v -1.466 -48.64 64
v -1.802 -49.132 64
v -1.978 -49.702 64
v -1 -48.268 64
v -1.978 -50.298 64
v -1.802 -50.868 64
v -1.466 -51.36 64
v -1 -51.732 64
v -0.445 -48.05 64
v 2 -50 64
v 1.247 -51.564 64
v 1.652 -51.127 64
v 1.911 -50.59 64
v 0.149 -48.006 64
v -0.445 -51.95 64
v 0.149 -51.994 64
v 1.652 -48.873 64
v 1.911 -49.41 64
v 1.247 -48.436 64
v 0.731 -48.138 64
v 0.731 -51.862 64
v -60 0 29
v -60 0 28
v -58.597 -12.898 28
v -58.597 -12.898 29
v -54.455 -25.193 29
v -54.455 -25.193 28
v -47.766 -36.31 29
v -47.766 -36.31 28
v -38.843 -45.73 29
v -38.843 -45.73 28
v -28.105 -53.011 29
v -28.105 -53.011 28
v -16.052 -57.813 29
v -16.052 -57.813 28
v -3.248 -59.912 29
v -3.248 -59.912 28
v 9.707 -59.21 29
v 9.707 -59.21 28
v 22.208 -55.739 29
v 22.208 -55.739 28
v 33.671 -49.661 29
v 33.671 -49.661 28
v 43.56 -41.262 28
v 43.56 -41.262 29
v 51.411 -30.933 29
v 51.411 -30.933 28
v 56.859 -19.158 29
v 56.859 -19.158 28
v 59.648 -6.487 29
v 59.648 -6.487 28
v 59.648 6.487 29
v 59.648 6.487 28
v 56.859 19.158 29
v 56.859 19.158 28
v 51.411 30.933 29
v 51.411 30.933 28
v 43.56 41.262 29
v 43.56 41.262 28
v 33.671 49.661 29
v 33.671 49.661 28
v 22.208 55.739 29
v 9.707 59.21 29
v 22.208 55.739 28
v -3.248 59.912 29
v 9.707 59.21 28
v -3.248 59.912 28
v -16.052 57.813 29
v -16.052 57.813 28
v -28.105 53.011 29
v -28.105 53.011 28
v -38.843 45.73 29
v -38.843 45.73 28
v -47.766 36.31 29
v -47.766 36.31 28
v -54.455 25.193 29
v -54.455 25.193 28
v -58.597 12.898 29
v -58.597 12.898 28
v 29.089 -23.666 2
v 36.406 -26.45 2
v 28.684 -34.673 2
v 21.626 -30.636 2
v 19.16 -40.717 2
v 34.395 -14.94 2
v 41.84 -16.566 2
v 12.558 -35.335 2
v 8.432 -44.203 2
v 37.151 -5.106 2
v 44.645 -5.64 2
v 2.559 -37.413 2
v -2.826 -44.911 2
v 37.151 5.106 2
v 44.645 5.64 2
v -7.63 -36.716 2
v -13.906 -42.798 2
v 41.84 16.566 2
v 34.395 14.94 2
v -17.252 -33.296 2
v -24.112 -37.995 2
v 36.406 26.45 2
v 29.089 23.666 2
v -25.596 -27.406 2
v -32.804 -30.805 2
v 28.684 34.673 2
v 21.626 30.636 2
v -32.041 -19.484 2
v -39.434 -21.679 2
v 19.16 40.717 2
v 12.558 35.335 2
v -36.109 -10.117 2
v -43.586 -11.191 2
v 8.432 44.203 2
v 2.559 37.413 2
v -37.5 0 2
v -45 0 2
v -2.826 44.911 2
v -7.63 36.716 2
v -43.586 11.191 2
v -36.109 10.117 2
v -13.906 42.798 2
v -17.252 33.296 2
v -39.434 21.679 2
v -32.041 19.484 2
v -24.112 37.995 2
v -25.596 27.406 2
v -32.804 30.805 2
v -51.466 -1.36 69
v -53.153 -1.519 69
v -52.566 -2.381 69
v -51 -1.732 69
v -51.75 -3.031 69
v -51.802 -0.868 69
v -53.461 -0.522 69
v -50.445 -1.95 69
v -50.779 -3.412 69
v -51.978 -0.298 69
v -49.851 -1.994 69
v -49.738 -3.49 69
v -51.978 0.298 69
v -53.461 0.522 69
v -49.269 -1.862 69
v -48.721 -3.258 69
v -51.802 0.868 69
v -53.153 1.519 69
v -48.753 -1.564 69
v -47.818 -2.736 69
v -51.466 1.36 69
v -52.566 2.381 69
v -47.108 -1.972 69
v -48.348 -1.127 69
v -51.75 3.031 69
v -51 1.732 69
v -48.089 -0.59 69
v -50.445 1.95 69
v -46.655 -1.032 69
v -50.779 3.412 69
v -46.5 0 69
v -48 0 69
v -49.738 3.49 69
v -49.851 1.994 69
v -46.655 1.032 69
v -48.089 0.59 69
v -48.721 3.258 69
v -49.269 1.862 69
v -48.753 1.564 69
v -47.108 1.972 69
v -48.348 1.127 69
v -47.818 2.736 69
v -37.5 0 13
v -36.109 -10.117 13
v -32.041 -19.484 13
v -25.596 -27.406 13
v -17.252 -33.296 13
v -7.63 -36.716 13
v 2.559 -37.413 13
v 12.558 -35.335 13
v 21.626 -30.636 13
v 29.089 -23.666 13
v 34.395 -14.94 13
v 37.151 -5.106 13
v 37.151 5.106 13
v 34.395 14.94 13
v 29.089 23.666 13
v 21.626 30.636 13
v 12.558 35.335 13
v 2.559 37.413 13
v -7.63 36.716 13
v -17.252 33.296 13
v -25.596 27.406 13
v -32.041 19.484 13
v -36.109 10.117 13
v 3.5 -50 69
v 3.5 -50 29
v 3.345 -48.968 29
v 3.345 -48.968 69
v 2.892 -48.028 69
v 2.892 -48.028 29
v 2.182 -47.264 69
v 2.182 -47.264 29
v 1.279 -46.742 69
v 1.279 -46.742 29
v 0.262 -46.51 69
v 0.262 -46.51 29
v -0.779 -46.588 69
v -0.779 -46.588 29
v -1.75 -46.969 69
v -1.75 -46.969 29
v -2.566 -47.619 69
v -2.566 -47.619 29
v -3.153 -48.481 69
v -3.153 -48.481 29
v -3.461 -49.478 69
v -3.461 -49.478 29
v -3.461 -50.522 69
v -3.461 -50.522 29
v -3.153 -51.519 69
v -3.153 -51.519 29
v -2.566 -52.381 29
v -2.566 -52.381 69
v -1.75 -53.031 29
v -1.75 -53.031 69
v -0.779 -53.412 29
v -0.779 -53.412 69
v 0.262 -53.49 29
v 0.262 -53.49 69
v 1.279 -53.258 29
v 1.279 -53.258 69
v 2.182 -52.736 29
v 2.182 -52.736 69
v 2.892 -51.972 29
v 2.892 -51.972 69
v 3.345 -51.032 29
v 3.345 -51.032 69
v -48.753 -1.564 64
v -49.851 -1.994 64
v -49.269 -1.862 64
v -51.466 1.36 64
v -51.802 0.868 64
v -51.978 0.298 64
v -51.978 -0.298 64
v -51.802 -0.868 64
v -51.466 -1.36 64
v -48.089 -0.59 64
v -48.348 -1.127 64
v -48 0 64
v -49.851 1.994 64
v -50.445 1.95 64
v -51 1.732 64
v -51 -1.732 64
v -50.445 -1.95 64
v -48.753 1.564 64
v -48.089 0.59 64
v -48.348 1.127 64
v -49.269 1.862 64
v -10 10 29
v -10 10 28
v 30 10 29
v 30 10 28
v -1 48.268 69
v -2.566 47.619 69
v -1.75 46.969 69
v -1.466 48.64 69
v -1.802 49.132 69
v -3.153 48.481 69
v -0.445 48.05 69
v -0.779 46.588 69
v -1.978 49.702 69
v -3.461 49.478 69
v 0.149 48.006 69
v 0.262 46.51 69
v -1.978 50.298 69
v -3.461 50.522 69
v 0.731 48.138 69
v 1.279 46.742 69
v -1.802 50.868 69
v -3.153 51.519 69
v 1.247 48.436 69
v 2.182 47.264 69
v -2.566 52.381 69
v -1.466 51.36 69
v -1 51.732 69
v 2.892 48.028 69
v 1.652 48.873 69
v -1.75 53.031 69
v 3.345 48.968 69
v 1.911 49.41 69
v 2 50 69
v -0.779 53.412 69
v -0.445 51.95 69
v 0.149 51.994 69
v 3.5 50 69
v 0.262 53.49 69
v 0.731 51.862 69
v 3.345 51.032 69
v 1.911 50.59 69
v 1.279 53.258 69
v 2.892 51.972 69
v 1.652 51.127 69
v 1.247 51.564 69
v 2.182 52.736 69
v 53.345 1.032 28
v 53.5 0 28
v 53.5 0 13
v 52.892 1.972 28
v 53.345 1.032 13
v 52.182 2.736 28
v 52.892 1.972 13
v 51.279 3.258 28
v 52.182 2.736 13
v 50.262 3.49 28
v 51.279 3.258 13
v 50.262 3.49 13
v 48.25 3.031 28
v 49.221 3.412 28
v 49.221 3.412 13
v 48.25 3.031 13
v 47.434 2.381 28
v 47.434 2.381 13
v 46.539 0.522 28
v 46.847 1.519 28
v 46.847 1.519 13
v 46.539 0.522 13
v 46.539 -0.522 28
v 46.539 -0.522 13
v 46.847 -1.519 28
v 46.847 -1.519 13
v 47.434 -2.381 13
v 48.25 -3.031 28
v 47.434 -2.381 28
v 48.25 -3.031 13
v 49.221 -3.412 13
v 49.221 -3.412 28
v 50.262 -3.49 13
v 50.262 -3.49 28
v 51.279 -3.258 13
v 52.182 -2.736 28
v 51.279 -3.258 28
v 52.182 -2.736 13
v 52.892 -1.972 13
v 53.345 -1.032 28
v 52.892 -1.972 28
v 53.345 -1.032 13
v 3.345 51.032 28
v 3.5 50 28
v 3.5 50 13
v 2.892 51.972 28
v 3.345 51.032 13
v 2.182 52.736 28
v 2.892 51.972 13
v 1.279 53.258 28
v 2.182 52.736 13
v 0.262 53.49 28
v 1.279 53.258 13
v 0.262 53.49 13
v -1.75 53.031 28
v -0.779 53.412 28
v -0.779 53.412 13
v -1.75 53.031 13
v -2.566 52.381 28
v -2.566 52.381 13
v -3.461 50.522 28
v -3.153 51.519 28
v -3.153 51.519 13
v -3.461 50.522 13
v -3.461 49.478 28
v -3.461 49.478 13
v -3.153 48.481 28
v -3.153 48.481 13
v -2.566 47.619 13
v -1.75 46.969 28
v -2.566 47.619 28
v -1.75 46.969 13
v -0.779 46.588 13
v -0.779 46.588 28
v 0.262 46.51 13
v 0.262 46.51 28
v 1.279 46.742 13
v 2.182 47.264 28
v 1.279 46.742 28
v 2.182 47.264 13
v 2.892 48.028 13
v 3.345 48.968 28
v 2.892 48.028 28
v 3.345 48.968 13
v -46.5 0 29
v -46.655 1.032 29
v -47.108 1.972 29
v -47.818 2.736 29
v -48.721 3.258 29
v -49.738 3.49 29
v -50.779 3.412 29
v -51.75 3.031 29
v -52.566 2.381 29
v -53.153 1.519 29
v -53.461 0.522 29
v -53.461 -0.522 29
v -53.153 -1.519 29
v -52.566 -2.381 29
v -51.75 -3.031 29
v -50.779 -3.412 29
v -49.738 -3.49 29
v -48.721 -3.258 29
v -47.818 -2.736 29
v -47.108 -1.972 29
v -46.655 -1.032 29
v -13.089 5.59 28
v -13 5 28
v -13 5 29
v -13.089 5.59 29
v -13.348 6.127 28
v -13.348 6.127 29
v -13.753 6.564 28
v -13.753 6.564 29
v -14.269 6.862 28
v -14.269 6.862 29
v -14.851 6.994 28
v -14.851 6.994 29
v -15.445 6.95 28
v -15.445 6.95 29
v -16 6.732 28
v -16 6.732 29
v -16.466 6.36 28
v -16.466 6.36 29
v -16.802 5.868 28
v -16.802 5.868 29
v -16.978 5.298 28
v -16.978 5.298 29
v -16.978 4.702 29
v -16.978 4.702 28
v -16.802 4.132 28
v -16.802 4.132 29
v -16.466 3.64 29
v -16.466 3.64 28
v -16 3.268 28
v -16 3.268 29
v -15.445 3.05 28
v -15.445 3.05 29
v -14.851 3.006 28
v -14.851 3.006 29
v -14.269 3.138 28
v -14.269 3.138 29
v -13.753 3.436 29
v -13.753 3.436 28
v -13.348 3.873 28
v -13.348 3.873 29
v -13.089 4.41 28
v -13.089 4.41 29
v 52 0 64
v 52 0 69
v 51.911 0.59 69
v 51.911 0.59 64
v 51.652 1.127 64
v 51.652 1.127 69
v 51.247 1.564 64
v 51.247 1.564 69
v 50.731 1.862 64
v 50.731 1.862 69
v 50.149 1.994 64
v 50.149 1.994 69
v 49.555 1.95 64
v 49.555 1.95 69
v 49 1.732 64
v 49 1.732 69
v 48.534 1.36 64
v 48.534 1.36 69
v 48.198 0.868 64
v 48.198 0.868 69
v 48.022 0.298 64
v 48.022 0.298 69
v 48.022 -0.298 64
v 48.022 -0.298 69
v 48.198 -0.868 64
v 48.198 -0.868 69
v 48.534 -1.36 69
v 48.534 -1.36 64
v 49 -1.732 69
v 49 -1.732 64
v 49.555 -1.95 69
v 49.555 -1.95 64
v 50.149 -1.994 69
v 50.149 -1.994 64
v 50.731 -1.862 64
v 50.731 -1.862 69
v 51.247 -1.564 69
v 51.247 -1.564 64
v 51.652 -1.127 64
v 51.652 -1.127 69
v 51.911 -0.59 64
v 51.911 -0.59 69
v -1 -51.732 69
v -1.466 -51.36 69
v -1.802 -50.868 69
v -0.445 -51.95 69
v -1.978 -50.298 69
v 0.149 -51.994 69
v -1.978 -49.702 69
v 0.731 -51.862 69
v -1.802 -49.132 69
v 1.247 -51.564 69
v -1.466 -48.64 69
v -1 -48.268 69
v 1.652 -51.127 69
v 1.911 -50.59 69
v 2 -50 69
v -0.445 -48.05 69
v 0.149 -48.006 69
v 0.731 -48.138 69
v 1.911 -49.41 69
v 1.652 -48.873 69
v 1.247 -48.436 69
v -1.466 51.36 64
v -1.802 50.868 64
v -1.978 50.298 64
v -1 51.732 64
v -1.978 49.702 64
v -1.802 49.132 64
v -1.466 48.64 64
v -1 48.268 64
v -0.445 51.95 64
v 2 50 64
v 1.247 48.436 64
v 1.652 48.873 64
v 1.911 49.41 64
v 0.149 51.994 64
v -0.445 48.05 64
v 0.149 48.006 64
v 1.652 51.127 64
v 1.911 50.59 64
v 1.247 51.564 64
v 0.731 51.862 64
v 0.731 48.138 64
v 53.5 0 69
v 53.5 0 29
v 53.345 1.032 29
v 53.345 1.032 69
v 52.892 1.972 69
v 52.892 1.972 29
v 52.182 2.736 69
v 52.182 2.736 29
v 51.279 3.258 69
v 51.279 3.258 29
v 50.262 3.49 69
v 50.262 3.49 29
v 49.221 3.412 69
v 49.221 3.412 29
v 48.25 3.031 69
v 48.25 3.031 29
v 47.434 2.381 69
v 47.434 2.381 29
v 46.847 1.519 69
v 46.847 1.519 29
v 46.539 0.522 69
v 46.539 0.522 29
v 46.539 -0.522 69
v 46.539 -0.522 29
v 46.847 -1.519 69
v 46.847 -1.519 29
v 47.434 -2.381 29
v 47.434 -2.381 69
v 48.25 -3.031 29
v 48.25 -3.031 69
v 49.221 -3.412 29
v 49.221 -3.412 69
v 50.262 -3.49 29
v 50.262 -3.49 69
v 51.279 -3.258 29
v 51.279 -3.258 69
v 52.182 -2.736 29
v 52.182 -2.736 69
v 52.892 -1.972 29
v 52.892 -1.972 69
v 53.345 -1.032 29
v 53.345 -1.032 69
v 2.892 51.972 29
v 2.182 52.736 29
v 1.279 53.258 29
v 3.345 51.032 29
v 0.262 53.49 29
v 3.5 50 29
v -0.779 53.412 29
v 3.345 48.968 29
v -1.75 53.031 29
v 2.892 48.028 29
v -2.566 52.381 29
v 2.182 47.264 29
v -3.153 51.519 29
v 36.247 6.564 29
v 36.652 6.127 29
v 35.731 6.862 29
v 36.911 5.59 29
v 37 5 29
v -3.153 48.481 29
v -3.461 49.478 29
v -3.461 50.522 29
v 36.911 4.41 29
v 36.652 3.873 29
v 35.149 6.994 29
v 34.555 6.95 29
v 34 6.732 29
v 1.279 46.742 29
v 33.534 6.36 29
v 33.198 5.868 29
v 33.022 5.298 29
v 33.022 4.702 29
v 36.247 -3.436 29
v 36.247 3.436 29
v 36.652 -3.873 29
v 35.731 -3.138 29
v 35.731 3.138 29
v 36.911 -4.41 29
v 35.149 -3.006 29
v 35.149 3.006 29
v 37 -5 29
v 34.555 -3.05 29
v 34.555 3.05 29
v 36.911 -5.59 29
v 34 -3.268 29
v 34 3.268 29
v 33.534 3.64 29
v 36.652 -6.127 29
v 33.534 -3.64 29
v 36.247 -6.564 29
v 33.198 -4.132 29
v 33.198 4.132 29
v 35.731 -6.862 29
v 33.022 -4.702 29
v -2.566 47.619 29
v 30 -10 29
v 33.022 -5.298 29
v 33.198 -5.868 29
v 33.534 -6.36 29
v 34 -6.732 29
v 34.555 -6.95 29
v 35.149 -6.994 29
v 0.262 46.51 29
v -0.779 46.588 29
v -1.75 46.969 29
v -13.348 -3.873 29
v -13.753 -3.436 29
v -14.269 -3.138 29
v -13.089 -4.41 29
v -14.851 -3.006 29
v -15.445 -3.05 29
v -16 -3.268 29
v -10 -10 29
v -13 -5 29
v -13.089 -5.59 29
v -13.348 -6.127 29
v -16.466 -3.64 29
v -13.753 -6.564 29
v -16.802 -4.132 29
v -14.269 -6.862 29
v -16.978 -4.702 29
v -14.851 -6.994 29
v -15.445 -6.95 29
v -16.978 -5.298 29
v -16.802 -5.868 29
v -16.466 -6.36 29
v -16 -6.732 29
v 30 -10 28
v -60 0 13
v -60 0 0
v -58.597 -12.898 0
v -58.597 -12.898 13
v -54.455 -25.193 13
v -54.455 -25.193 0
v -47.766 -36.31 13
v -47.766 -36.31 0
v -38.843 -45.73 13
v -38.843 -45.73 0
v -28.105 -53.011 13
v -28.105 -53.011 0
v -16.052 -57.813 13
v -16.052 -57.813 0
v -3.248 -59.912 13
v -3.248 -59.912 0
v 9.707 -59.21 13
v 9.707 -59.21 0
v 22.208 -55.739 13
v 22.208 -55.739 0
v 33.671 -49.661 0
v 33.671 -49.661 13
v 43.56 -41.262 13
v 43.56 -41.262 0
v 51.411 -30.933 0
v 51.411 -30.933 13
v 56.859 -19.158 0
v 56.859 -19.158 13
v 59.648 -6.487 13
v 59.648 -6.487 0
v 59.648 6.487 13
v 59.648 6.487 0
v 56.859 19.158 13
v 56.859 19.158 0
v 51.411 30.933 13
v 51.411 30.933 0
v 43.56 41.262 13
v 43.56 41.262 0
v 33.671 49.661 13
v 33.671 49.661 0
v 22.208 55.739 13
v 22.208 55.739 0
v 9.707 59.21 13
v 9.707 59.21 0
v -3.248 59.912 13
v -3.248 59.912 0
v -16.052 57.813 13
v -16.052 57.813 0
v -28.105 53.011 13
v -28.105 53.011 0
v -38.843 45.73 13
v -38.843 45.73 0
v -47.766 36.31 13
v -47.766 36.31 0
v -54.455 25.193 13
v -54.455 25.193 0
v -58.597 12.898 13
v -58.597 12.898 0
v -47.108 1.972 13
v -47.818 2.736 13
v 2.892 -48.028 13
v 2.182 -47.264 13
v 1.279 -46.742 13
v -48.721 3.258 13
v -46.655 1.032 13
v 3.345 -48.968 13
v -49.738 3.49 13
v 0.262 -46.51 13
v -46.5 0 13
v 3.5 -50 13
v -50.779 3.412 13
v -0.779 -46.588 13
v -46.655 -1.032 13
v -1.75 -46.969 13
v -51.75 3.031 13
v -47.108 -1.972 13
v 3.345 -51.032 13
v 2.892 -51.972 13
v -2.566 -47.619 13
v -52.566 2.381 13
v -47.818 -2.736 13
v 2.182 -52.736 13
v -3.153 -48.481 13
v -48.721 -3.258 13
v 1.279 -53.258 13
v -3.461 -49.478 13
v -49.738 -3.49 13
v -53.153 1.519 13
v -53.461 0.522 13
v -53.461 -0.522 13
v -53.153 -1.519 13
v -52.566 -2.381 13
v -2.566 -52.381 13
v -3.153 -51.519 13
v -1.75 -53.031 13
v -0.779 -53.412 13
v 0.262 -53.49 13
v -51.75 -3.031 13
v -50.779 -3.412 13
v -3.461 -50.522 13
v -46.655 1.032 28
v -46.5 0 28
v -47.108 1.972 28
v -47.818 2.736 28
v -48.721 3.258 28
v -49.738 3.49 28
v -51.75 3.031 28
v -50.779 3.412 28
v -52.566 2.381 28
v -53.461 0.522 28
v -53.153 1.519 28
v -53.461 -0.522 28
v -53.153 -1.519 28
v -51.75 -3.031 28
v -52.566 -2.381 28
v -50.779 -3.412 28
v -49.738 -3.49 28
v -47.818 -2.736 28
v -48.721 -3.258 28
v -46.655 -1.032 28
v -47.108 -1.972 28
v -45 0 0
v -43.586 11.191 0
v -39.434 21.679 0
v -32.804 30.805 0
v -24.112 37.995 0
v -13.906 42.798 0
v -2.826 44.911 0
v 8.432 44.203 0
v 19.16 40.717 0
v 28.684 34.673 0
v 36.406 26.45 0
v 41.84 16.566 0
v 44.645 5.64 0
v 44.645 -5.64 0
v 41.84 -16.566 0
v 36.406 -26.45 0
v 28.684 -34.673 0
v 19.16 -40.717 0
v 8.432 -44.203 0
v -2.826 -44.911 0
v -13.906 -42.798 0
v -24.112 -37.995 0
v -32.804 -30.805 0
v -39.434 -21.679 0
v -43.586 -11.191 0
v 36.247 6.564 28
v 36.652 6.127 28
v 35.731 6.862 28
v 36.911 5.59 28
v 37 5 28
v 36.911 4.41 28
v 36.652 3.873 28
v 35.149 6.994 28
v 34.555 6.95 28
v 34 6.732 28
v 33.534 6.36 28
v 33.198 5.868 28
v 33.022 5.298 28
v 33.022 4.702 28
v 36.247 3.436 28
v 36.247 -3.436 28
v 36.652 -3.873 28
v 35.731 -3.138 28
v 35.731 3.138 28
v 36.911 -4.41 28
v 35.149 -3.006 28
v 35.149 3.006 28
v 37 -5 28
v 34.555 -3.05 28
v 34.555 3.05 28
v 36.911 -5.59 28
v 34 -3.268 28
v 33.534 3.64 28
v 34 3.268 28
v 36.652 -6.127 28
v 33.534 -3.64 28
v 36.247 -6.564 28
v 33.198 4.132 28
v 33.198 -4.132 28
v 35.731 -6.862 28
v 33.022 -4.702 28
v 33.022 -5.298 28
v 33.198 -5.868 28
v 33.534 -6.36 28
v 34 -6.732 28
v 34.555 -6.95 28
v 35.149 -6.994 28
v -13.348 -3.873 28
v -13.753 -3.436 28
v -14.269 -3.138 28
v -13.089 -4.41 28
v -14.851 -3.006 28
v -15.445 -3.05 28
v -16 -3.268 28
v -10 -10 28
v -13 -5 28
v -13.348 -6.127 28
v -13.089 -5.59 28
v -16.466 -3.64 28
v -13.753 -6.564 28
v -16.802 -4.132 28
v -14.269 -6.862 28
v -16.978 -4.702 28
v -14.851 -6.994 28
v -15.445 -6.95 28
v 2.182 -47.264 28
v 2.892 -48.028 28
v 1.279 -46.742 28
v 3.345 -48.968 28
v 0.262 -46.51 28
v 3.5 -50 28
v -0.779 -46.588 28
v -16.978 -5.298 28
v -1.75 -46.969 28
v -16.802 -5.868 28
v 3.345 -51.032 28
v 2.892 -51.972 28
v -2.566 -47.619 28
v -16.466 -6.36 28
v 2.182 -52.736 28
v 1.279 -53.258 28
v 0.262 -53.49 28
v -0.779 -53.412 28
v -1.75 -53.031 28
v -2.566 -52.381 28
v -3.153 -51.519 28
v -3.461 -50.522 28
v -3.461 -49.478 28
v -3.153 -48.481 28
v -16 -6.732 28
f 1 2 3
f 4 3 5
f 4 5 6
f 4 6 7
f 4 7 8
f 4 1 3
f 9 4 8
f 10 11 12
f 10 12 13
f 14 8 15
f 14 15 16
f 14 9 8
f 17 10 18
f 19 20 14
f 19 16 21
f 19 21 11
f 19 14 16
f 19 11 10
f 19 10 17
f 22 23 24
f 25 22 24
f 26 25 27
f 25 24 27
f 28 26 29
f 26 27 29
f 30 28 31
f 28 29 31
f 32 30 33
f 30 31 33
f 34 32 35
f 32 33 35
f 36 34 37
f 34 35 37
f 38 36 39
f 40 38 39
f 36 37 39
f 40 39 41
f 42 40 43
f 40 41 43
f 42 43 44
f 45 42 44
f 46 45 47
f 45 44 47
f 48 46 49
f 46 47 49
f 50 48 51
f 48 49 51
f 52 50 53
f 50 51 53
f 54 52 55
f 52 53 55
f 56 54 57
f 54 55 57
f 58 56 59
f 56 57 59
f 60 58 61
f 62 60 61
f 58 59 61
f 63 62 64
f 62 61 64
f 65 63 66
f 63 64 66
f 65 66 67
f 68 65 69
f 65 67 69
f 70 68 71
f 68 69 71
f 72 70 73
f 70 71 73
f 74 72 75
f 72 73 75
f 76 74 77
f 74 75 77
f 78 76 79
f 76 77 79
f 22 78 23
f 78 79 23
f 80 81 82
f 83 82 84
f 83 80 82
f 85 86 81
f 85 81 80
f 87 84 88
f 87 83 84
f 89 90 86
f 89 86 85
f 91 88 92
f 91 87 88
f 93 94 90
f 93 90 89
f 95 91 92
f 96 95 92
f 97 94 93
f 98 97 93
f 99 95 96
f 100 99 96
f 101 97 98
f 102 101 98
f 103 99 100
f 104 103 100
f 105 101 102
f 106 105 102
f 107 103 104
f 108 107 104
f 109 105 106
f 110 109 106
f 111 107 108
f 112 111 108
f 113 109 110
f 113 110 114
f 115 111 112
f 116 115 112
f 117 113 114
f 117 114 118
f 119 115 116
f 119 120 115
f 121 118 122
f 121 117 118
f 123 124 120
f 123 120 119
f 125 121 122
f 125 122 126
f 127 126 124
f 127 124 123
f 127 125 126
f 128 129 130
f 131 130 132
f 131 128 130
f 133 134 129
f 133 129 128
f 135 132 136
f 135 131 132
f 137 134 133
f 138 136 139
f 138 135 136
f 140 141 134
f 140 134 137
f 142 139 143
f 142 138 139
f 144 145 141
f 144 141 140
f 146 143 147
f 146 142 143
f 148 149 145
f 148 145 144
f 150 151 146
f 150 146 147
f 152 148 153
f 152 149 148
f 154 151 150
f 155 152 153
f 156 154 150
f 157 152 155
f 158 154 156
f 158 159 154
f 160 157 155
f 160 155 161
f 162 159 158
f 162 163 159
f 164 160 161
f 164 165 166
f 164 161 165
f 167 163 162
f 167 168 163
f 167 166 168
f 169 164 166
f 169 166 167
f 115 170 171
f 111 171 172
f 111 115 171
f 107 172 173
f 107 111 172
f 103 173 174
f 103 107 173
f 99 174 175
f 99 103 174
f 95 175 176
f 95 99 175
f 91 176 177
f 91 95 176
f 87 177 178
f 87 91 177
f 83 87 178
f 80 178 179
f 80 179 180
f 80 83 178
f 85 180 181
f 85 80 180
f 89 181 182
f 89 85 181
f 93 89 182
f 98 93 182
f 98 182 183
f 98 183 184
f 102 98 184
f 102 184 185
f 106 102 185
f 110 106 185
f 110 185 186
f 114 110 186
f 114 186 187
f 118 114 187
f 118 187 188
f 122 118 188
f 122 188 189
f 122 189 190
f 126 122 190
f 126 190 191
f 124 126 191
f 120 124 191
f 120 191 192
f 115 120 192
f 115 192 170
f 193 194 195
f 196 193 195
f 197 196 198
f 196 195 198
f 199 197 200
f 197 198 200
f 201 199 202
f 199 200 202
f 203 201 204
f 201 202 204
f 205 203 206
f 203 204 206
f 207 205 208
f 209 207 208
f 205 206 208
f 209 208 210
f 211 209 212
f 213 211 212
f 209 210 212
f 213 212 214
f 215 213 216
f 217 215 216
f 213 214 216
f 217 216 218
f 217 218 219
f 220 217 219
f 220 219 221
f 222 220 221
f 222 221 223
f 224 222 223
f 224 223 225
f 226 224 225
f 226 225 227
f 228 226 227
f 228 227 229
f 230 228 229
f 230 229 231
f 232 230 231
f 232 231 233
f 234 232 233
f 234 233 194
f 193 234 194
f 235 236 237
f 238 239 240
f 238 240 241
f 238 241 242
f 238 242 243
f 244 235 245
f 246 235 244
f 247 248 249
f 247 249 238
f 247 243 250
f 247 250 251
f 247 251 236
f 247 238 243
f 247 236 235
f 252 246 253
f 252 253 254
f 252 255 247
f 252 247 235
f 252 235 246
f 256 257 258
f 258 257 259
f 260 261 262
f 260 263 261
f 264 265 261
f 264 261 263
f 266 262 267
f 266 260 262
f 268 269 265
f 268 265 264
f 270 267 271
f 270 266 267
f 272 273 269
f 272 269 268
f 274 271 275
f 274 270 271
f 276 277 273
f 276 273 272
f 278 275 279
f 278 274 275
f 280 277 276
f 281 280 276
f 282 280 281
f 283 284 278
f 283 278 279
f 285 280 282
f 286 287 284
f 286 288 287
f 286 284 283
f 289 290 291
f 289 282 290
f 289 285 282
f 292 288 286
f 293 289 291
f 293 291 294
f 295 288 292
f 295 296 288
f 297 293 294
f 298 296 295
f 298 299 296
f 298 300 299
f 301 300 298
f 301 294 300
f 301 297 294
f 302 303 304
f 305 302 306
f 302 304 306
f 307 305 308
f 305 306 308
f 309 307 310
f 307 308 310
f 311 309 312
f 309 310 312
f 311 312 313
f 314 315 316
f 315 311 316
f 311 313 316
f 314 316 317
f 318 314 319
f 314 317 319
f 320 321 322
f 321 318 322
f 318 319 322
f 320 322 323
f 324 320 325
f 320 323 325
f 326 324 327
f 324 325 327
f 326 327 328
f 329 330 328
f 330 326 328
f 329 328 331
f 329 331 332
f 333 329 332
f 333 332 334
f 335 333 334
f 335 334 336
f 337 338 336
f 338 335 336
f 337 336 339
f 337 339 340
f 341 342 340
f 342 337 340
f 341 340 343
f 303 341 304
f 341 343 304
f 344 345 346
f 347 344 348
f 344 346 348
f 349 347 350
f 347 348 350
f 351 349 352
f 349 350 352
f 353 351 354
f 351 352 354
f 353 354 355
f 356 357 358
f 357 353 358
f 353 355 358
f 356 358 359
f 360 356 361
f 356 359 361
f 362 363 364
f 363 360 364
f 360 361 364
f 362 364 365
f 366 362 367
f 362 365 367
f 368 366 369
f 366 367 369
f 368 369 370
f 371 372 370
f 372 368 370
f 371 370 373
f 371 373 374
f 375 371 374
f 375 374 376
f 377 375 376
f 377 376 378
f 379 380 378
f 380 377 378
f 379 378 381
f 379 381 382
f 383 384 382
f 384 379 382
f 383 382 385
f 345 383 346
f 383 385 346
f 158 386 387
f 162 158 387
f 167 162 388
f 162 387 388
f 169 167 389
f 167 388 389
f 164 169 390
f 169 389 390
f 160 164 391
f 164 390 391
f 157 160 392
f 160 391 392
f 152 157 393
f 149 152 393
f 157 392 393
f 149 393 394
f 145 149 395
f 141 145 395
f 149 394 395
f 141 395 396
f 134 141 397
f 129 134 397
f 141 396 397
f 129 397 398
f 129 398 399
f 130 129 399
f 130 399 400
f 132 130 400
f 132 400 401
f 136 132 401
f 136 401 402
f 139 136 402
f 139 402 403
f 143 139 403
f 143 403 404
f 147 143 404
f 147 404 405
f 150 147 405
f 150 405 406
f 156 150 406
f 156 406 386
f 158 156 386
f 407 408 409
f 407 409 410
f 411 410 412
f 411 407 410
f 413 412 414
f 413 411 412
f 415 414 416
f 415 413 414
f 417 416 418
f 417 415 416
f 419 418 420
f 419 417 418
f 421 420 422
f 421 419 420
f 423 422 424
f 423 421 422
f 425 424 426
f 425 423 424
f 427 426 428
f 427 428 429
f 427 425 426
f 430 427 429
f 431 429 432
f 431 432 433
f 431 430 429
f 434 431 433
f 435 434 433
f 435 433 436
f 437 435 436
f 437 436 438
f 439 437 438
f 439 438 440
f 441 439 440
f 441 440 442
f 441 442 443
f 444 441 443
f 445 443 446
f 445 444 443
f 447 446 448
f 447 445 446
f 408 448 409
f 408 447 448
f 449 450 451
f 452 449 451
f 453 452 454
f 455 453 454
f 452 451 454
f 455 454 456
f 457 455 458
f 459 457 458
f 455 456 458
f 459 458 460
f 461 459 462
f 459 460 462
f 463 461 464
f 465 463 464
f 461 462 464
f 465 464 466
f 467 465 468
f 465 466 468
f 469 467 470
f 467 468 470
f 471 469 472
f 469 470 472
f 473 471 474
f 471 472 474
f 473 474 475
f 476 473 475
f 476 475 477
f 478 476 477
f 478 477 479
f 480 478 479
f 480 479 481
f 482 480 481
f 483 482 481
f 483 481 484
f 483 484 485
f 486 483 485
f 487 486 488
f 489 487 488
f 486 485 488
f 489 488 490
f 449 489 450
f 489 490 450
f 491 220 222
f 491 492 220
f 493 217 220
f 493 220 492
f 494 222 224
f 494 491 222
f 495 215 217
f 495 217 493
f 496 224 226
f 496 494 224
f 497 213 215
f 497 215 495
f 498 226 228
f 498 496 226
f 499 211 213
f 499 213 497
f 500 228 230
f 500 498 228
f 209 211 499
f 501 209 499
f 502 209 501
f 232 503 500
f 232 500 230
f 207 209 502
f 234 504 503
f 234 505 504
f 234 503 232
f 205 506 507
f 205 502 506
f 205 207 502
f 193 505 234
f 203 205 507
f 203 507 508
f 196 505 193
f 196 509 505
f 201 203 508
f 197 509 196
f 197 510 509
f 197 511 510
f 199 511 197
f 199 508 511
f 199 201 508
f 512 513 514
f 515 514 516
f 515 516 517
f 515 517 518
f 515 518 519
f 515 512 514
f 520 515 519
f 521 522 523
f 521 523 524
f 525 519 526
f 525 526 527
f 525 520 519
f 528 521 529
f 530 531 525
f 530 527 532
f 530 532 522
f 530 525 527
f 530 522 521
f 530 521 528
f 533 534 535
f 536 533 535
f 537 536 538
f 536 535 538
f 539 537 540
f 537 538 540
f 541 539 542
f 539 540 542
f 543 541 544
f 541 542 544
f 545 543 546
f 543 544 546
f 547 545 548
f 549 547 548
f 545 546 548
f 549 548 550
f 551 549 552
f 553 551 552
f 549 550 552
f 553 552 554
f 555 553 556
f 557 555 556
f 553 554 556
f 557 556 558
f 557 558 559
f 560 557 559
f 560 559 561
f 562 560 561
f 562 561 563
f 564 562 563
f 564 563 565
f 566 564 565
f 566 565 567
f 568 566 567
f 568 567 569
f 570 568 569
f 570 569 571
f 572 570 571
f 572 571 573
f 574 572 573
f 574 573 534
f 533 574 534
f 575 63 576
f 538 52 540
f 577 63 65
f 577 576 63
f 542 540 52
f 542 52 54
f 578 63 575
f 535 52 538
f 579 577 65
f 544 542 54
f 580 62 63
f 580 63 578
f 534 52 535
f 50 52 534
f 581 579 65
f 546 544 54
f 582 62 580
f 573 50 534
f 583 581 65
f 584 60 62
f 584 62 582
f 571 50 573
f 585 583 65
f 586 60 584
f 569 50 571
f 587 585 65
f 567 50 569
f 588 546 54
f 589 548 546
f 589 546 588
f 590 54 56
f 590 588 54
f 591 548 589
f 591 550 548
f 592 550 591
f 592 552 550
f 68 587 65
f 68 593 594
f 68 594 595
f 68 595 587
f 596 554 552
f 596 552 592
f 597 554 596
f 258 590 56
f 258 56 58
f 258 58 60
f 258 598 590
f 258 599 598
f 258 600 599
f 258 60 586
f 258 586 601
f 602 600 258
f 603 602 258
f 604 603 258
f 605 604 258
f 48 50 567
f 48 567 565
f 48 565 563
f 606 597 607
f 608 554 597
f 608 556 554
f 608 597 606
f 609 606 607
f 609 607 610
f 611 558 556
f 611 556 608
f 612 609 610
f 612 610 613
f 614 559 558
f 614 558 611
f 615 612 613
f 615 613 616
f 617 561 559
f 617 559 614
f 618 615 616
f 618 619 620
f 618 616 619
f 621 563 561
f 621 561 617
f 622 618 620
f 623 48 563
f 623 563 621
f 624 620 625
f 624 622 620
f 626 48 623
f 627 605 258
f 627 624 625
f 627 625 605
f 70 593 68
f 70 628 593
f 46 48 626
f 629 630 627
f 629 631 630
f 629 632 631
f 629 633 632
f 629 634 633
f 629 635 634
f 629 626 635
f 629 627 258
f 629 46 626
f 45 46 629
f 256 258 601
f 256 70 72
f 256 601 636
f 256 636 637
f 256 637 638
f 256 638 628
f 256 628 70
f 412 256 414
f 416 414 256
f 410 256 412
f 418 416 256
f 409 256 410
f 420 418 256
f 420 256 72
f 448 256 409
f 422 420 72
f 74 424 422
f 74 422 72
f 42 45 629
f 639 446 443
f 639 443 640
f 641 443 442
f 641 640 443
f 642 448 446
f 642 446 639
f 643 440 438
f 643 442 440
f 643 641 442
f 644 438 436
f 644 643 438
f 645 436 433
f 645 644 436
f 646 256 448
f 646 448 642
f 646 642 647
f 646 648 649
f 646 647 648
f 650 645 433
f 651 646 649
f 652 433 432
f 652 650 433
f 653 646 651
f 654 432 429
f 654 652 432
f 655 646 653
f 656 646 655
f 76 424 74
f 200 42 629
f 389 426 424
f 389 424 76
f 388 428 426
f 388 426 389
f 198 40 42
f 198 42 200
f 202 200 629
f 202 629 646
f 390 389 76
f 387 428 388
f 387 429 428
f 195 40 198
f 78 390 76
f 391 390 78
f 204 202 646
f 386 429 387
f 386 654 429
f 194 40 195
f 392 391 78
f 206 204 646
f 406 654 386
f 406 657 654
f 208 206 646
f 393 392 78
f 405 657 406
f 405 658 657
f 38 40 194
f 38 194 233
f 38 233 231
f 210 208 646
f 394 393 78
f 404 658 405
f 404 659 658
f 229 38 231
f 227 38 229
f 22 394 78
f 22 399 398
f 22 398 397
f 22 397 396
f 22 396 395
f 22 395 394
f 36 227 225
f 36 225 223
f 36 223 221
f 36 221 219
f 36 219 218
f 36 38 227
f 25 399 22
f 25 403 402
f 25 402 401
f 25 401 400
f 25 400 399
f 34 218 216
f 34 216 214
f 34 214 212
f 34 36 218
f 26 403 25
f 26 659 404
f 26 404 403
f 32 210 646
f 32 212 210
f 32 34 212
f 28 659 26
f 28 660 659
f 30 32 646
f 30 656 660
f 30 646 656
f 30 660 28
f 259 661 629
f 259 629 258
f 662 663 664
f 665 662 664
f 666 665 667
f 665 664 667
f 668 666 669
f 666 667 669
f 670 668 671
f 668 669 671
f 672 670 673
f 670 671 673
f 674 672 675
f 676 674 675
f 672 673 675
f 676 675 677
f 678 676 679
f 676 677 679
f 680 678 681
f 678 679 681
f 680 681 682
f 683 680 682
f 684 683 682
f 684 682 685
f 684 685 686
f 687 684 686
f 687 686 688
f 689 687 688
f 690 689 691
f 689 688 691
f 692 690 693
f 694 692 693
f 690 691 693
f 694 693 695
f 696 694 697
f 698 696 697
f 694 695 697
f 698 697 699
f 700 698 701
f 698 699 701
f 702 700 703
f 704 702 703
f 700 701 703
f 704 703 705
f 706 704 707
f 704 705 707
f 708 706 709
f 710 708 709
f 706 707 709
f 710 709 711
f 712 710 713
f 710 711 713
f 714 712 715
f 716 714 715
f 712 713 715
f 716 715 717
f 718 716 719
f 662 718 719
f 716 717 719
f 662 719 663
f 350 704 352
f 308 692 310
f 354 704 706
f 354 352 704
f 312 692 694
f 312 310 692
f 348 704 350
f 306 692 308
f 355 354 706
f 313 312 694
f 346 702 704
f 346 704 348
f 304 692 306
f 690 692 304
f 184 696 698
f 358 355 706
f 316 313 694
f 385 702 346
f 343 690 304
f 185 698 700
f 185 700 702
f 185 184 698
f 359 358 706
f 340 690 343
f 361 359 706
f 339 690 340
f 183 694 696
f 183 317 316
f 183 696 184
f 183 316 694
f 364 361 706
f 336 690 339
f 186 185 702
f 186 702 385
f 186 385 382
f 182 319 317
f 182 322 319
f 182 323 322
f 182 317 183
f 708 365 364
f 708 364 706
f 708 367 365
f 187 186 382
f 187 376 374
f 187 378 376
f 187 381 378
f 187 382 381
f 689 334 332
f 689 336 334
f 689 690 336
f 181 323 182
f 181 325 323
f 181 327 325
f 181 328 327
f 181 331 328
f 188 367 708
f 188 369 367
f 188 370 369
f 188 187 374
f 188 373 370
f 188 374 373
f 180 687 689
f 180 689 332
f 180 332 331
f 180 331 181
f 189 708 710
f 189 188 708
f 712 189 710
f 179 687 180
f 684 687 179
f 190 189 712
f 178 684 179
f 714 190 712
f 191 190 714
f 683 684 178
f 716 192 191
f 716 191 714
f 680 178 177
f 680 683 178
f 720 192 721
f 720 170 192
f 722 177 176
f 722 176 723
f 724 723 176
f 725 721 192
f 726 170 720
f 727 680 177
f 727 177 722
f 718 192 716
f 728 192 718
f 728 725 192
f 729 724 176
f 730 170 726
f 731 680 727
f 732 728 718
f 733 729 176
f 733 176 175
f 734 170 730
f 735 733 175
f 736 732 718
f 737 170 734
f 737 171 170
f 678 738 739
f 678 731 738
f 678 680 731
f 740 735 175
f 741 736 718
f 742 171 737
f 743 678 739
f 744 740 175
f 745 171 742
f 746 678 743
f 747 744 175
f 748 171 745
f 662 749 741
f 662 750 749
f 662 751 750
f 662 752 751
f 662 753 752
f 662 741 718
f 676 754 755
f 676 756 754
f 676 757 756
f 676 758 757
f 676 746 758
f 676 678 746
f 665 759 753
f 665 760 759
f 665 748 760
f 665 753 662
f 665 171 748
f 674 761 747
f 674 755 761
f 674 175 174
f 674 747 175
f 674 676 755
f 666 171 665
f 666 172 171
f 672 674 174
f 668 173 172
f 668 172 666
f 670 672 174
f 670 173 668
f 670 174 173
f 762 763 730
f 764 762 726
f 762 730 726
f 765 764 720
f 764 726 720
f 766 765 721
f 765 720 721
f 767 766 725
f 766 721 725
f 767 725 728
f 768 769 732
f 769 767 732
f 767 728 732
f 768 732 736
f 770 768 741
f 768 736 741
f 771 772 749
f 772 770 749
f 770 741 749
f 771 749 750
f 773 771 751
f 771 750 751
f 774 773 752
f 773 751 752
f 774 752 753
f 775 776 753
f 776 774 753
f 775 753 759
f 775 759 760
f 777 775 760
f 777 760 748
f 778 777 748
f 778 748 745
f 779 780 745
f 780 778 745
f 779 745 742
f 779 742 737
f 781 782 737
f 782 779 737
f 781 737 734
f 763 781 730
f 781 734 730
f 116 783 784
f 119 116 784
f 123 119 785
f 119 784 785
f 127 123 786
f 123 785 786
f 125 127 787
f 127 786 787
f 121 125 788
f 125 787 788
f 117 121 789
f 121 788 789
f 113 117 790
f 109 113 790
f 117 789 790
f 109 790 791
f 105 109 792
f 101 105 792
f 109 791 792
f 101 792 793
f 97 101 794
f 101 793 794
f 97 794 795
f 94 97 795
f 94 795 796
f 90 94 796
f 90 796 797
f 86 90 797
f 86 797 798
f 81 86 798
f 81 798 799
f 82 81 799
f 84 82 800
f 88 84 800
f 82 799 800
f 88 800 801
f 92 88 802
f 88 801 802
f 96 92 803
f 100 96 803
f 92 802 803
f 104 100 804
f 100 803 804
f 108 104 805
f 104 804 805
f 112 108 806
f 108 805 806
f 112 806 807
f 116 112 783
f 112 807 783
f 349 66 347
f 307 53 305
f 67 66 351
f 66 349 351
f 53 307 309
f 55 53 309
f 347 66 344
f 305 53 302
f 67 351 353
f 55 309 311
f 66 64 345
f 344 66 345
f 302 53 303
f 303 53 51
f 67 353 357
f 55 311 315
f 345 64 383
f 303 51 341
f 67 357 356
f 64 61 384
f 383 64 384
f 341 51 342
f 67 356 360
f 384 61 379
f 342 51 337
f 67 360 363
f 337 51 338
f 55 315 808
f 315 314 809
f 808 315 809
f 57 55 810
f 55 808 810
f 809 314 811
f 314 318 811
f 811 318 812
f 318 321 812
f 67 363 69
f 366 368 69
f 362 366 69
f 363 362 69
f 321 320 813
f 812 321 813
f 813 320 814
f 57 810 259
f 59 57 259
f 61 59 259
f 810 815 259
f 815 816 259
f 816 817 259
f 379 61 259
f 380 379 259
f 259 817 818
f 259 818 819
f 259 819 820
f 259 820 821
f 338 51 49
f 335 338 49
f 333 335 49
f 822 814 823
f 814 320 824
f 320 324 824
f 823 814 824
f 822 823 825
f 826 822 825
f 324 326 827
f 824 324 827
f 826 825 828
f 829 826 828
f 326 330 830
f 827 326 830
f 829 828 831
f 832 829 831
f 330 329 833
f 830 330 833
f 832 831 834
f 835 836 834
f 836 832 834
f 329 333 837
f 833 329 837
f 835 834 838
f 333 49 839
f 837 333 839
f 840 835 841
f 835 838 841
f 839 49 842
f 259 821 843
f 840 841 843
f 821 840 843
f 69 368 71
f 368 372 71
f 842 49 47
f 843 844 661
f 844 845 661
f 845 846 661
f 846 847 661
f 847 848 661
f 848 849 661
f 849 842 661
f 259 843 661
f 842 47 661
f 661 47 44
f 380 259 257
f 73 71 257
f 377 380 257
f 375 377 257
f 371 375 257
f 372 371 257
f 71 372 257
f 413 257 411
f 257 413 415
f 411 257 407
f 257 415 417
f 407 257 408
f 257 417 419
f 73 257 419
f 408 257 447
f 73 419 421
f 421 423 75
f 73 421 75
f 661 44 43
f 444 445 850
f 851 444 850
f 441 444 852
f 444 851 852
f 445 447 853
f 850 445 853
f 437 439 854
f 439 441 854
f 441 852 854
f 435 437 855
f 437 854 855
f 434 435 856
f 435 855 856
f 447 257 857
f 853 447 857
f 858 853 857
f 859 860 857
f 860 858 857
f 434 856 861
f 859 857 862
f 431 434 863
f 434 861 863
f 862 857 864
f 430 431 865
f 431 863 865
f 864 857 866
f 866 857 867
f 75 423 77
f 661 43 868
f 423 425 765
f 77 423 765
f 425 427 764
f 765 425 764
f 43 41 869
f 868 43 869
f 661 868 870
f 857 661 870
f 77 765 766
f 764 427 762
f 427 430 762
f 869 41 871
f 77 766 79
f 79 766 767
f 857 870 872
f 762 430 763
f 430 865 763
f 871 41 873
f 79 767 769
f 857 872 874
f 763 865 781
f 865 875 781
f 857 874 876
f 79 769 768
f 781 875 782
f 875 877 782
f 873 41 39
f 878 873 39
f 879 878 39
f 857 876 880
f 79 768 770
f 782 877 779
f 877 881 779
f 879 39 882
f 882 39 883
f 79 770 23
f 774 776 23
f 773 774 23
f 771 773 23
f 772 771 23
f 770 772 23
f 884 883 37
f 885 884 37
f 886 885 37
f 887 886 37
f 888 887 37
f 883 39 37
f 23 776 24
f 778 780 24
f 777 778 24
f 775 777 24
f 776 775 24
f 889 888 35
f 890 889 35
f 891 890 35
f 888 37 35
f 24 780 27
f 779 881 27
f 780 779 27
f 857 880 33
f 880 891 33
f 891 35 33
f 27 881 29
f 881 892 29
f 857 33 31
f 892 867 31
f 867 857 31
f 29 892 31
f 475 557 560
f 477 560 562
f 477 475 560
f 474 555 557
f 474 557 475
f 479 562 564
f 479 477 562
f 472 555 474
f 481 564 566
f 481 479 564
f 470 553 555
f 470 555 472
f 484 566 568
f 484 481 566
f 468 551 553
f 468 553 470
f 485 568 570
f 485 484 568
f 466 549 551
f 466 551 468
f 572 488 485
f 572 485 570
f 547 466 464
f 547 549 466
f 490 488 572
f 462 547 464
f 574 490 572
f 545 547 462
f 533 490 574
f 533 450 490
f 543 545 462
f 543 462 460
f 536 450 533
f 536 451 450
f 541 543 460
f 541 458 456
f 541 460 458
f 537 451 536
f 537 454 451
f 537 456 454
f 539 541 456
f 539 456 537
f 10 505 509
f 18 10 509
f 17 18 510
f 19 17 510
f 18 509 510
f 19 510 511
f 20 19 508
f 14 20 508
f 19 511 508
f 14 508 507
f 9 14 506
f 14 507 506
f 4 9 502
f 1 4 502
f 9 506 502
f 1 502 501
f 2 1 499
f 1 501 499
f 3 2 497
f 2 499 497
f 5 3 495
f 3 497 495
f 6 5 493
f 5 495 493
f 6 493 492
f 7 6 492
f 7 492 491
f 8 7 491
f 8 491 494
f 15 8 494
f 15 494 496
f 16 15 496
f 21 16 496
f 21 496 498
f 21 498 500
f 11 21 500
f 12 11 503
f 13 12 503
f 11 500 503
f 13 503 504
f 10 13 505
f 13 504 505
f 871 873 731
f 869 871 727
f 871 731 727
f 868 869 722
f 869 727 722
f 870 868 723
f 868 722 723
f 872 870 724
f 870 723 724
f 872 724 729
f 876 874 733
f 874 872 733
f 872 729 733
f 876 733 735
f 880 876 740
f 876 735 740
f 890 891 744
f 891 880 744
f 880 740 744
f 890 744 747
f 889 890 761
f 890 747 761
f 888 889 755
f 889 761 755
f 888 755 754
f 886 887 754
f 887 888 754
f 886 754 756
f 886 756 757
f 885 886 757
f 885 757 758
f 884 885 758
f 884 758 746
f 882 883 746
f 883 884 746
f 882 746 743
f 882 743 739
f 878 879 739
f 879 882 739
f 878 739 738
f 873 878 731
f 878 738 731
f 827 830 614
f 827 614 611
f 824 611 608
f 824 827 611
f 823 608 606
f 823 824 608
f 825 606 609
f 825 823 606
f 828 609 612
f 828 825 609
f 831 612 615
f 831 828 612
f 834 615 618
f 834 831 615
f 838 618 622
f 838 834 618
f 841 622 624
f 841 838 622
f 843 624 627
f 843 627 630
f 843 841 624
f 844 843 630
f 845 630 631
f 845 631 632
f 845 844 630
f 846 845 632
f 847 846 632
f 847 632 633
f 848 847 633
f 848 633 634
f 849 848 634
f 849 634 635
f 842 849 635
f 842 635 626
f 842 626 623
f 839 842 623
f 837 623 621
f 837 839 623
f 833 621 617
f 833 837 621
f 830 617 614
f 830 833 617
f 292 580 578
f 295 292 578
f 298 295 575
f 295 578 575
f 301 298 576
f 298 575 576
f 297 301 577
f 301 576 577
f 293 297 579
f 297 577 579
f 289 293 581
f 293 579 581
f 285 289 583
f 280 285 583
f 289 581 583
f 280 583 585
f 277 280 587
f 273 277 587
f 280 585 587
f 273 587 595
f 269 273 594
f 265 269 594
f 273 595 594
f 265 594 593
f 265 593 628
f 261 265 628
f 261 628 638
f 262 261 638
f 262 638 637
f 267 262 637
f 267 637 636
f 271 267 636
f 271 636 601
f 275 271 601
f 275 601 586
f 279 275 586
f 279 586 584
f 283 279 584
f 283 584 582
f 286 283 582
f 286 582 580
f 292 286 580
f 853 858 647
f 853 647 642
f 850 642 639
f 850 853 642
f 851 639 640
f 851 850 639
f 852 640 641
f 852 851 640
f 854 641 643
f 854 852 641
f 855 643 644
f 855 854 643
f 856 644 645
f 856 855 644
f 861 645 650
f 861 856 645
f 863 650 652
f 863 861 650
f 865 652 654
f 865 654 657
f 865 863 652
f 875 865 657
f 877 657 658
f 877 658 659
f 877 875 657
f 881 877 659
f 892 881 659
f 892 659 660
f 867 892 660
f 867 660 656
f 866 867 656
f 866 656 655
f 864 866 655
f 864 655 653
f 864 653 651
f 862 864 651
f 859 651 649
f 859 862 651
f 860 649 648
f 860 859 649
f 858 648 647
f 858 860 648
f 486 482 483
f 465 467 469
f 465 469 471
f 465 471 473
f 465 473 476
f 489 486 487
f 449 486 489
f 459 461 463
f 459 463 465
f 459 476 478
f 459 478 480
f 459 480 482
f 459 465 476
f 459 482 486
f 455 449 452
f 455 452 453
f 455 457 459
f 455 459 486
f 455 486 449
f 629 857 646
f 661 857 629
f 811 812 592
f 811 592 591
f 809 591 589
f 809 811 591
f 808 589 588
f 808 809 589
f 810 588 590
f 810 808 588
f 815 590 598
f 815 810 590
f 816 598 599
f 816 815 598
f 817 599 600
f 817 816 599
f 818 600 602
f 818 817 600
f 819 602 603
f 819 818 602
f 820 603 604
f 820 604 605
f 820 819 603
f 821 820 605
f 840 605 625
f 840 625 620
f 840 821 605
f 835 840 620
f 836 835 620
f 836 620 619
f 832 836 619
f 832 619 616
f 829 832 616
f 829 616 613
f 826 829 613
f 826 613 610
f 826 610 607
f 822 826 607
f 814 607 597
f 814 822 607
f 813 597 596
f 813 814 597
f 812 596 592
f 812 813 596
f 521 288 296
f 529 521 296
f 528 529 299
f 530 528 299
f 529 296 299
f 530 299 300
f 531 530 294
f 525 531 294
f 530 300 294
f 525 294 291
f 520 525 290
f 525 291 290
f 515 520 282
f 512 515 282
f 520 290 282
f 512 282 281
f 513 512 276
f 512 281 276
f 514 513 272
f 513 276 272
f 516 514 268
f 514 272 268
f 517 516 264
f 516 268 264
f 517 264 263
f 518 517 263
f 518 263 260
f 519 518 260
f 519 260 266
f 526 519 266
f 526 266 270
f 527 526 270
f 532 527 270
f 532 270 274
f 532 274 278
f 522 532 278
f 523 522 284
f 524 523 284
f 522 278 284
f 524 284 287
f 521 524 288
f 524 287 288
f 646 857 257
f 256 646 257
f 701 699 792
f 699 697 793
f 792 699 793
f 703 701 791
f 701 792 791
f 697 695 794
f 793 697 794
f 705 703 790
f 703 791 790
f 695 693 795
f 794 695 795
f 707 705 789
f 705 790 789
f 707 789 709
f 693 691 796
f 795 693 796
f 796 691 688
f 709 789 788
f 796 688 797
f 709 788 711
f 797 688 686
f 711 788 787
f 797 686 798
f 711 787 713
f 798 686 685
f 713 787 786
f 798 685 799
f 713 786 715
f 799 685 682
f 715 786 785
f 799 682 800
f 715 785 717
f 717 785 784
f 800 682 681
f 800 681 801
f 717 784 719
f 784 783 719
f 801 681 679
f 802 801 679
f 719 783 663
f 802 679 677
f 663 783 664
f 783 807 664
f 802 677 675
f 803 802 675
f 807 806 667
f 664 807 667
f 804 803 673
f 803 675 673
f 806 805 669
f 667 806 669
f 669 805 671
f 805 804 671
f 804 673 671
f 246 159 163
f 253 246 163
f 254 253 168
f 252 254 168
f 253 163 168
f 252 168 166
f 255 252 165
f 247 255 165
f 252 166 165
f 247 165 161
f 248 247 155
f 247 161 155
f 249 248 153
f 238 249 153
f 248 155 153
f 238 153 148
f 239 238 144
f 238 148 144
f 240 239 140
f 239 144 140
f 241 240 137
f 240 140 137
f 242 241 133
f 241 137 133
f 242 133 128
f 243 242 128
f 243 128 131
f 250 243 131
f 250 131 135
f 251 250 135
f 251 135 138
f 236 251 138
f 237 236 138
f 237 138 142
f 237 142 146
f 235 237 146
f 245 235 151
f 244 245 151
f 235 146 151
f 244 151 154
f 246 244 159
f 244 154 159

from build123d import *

# Parameters (mm, degrees)
SKETCH_1_R          = 60
SKETCH_1_R_2        = 37.5
EXTRUDE_1_DEPTH     = 13
SKETCH_4_R          = 60
SKETCH_4_R_2        = 2
SKETCH_4_W          = 40
SKETCH_4_H          = 20
EXTRUDE_2_DEPTH     = 1
SKETCH_5_R          = 3.5
EXTRUDE_3_DEPTH     = 56
SKETCH_6_R          = 2
CUT_EXTRUDE_1_DEPTH = 5
SKETCH_7_R          = 45
CUT_EXTRUDE_2_DEPTH = 2


with BuildPart() as part:
    # 草图1 → 凸台-拉伸1 (new body)
    with BuildSketch(Plane.XY):
        with Locations(Location((0, 0, 0), (0, 0, 180))):
            Circle(SKETCH_1_R)
        with Locations(Location((0, 0, 0), (0, 0, 180))):
            Circle(SKETCH_1_R_2, mode=Mode.SUBTRACT)
    extrude(amount=EXTRUDE_1_DEPTH)



with BuildPart() as body_2:
    # 草图4 → 凸台-拉伸2 (new body)
    with BuildSketch(Plane.XY.offset(28)):
        with Locations(Location((0, 0, 0), (0, 0, 180))):
            Circle(SKETCH_4_R)
        with Locations((-15, 5)):
            Circle(SKETCH_4_R_2, mode=Mode.SUBTRACT)
        with Locations((35, 5)):
            Circle(SKETCH_4_R_2, mode=Mode.SUBTRACT)
        with Locations((35, -5)):
            Circle(SKETCH_4_R_2, mode=Mode.SUBTRACT)
        with Locations((-15, -5)):
            Circle(SKETCH_4_R_2, mode=Mode.SUBTRACT)
        with Locations((10, 0)):
            Rectangle(SKETCH_4_W, SKETCH_4_H, mode=Mode.SUBTRACT)
    extrude(amount=EXTRUDE_2_DEPTH)


with BuildPart() as part_1:
    add(part.part)

    add(body_2.part)  # 凸台-拉伸3 merges body 2
    # 草图5 → 凸台-拉伸3 (add)
    with BuildSketch(Plane.XY.offset(13)):
        with Locations((50, 0)):
            Circle(SKETCH_5_R)
        with Locations((0, -50)):
            Circle(SKETCH_5_R)
        with Locations((-50, 0)):
            Circle(SKETCH_5_R)
        with Locations((0, 50)):
            Circle(SKETCH_5_R)
    extrude(amount=EXTRUDE_3_DEPTH)

    # 草图6 → 切除-拉伸1 (cut)
    with BuildSketch(Plane.XY.offset(69)):
        with Locations((50, 0)):
            Circle(SKETCH_6_R)
        with Locations((0, 50)):
            Circle(SKETCH_6_R)
        with Locations((-50, 0)):
            Circle(SKETCH_6_R)
        with Locations((0, -50)):
            Circle(SKETCH_6_R)
    extrude(amount=-CUT_EXTRUDE_1_DEPTH, mode=Mode.SUBTRACT)

    # 草图7 → 切除-拉伸2 (cut)
    with BuildSketch(Plane(origin=(0, 0, 0), x_dir=(-1, 0, 0), z_dir=(0, 0, -1))):
        Circle(SKETCH_7_R)
    extrude(amount=-CUT_EXTRUDE_2_DEPTH, mode=Mode.SUBTRACT)


solid = part_1.part
